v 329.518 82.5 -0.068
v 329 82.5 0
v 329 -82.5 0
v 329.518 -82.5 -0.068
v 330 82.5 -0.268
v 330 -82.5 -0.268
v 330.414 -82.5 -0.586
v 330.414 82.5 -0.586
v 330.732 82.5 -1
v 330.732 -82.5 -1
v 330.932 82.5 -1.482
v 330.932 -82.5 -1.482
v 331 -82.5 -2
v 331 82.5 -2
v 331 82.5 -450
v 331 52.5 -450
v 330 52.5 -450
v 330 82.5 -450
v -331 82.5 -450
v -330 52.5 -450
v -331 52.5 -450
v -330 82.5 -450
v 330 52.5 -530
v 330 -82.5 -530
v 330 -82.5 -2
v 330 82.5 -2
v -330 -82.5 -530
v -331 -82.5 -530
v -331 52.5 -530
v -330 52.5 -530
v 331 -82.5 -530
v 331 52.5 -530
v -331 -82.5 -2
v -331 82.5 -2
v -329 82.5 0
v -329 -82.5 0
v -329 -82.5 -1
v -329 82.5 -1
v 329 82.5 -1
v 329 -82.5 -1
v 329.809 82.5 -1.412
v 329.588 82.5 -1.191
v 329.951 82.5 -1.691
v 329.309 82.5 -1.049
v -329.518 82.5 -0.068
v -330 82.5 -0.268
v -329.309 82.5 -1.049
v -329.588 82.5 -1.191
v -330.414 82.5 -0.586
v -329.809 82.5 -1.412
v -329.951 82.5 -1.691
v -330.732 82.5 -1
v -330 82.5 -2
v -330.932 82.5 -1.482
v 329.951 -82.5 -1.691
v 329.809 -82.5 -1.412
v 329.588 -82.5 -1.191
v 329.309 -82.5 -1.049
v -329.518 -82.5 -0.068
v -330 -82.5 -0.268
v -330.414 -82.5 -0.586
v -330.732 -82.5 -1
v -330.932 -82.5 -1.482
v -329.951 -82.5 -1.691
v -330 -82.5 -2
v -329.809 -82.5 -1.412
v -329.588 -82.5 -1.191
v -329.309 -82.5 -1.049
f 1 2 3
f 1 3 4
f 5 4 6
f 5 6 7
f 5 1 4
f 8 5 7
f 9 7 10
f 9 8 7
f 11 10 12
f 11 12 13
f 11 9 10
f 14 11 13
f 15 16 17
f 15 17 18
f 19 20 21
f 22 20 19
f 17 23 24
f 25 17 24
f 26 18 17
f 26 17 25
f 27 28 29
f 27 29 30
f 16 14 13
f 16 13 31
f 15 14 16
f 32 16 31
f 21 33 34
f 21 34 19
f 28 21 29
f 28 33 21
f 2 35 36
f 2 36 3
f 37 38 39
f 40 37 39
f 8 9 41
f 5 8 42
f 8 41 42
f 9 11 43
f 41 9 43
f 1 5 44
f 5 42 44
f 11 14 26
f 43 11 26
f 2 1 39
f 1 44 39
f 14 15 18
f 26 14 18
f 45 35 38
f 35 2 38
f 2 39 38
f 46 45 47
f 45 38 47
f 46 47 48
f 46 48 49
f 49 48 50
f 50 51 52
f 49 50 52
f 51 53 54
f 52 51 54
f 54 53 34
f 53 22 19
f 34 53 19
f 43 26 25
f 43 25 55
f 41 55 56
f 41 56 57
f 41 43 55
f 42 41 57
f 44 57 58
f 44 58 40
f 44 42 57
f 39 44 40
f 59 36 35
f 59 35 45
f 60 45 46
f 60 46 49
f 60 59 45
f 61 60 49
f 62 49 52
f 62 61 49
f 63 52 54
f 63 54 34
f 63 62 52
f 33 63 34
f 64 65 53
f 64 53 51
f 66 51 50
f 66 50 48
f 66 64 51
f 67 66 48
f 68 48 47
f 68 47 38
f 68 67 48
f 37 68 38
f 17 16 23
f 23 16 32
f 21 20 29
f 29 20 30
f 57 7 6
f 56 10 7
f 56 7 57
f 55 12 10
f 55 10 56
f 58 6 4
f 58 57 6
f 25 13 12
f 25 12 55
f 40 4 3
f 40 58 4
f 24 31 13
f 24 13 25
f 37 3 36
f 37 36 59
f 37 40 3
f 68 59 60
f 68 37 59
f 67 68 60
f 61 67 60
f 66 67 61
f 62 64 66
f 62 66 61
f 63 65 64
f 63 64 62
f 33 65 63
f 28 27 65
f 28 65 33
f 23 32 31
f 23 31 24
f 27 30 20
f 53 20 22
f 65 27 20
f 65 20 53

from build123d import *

# Parameters (mm, degrees)
SKETCH1_W                      = 660
SKETCH1_H                      = 165
BASE_FLANGE1_DEPTH             = 1
EDGE_FLANGE1_STRIP_W           = 6
EDGE_FLANGE1_STRIP_H           = 1
EDGE_FLANGE1_STRIP_CUT_DEPTH   = 165
EDGE_FLANGE1_STRIP_2_W         = 6
EDGE_FLANGE1_STRIP_2_H         = 1
EDGE_FLANGE1_STRIP_CUT_2_DEPTH = 165
EDGE_FLANGE1_DEPTH             = 165
EDGE_FLANGE1_BEND_DEPTH        = 165
SKETCH12_W                     = 80
SKETCH12_H                     = 30
CUT_EXTRUDE1_DEPTH             = 853.027141586


# Sheet-metal steps are written as plain solids
with BuildPart() as part:
    # Sketch1 → Base-Flange1 (new body)
    with BuildSketch(Plane.XY):
        Rectangle(SKETCH1_W, SKETCH1_H)
    extrude(amount=-BASE_FLANGE1_DEPTH)

    # Edge-Flange1 strip (across the edge) → Edge-Flange1 strip cut (cut)
    with BuildSketch(Plane(origin=(330, 82.5, -1), x_dir=(-1, 0, 0), z_dir=(0, -1, 0))):
        with Locations((-2, -0.5)):
            Rectangle(EDGE_FLANGE1_STRIP_W, EDGE_FLANGE1_STRIP_H)
    extrude(amount=EDGE_FLANGE1_STRIP_CUT_DEPTH, mode=Mode.SUBTRACT)

    # Edge-Flange1 strip 2 (across the edge) → Edge-Flange1 strip cut 2 (cut)
    with BuildSketch(Plane(origin=(-330, -82.5, -1), x_dir=(1, 0, 0), z_dir=(0, 1, 0))):
        with Locations((-2, -0.5)):
            Rectangle(EDGE_FLANGE1_STRIP_2_W, EDGE_FLANGE1_STRIP_2_H)
    extrude(amount=EDGE_FLANGE1_STRIP_CUT_2_DEPTH, mode=Mode.SUBTRACT)

    # Edge-Flange1 section (across the edge) → Edge-Flange1 (add)
    with BuildSketch(Plane(origin=(330, 82.5, -1), x_dir=(-1, 0, 0), z_dir=(0, -1, 0))):
        with BuildLine():
            Line((-1, 1), (-1, 529))
            Line((-1, 529), (0, 529))
            Line((0, 529), (0, 1))
            ThreePointArc((0, 1), (0.292893219, 0.292893219), (1, 0))
            Line((1, 0), (1, -1))
            ThreePointArc((1, -1), (-0.414213562, -0.414213562), (-1, 1))
        make_face()
    extrude(amount=EDGE_FLANGE1_DEPTH)

    # Edge-Flange1 section 2 (across the edge) → Edge-Flange1 bend (add)
    with BuildSketch(Plane(origin=(-330, -82.5, -1), x_dir=(1, 0, 0), z_dir=(0, 1, 0))):
        with BuildLine():
            Line((-1, 1), (-1, 529))
            Line((-1, 529), (0, 529))
            Line((0, 529), (0, 1))
            ThreePointArc((0, 1), (0.292893219, 0.292893219), (1, 0))
            Line((1, 0), (1, -1))
            ThreePointArc((1, -1), (-0.414213562, -0.414213562), (-1, 1))
        make_face()
    extrude(amount=EDGE_FLANGE1_BEND_DEPTH)

    # Sketch12 → Cut-Extrude1 (cut, through all)
    with BuildSketch(Plane(origin=(331, 0, 0), x_dir=(0, 0, -1), z_dir=(1, 0, 0))):
        with Locations((490, 67.5)):
            Rectangle(SKETCH12_W, SKETCH12_H)
    extrude(amount=-CUT_EXTRUDE1_DEPTH, mode=Mode.SUBTRACT)


solid = part.part
